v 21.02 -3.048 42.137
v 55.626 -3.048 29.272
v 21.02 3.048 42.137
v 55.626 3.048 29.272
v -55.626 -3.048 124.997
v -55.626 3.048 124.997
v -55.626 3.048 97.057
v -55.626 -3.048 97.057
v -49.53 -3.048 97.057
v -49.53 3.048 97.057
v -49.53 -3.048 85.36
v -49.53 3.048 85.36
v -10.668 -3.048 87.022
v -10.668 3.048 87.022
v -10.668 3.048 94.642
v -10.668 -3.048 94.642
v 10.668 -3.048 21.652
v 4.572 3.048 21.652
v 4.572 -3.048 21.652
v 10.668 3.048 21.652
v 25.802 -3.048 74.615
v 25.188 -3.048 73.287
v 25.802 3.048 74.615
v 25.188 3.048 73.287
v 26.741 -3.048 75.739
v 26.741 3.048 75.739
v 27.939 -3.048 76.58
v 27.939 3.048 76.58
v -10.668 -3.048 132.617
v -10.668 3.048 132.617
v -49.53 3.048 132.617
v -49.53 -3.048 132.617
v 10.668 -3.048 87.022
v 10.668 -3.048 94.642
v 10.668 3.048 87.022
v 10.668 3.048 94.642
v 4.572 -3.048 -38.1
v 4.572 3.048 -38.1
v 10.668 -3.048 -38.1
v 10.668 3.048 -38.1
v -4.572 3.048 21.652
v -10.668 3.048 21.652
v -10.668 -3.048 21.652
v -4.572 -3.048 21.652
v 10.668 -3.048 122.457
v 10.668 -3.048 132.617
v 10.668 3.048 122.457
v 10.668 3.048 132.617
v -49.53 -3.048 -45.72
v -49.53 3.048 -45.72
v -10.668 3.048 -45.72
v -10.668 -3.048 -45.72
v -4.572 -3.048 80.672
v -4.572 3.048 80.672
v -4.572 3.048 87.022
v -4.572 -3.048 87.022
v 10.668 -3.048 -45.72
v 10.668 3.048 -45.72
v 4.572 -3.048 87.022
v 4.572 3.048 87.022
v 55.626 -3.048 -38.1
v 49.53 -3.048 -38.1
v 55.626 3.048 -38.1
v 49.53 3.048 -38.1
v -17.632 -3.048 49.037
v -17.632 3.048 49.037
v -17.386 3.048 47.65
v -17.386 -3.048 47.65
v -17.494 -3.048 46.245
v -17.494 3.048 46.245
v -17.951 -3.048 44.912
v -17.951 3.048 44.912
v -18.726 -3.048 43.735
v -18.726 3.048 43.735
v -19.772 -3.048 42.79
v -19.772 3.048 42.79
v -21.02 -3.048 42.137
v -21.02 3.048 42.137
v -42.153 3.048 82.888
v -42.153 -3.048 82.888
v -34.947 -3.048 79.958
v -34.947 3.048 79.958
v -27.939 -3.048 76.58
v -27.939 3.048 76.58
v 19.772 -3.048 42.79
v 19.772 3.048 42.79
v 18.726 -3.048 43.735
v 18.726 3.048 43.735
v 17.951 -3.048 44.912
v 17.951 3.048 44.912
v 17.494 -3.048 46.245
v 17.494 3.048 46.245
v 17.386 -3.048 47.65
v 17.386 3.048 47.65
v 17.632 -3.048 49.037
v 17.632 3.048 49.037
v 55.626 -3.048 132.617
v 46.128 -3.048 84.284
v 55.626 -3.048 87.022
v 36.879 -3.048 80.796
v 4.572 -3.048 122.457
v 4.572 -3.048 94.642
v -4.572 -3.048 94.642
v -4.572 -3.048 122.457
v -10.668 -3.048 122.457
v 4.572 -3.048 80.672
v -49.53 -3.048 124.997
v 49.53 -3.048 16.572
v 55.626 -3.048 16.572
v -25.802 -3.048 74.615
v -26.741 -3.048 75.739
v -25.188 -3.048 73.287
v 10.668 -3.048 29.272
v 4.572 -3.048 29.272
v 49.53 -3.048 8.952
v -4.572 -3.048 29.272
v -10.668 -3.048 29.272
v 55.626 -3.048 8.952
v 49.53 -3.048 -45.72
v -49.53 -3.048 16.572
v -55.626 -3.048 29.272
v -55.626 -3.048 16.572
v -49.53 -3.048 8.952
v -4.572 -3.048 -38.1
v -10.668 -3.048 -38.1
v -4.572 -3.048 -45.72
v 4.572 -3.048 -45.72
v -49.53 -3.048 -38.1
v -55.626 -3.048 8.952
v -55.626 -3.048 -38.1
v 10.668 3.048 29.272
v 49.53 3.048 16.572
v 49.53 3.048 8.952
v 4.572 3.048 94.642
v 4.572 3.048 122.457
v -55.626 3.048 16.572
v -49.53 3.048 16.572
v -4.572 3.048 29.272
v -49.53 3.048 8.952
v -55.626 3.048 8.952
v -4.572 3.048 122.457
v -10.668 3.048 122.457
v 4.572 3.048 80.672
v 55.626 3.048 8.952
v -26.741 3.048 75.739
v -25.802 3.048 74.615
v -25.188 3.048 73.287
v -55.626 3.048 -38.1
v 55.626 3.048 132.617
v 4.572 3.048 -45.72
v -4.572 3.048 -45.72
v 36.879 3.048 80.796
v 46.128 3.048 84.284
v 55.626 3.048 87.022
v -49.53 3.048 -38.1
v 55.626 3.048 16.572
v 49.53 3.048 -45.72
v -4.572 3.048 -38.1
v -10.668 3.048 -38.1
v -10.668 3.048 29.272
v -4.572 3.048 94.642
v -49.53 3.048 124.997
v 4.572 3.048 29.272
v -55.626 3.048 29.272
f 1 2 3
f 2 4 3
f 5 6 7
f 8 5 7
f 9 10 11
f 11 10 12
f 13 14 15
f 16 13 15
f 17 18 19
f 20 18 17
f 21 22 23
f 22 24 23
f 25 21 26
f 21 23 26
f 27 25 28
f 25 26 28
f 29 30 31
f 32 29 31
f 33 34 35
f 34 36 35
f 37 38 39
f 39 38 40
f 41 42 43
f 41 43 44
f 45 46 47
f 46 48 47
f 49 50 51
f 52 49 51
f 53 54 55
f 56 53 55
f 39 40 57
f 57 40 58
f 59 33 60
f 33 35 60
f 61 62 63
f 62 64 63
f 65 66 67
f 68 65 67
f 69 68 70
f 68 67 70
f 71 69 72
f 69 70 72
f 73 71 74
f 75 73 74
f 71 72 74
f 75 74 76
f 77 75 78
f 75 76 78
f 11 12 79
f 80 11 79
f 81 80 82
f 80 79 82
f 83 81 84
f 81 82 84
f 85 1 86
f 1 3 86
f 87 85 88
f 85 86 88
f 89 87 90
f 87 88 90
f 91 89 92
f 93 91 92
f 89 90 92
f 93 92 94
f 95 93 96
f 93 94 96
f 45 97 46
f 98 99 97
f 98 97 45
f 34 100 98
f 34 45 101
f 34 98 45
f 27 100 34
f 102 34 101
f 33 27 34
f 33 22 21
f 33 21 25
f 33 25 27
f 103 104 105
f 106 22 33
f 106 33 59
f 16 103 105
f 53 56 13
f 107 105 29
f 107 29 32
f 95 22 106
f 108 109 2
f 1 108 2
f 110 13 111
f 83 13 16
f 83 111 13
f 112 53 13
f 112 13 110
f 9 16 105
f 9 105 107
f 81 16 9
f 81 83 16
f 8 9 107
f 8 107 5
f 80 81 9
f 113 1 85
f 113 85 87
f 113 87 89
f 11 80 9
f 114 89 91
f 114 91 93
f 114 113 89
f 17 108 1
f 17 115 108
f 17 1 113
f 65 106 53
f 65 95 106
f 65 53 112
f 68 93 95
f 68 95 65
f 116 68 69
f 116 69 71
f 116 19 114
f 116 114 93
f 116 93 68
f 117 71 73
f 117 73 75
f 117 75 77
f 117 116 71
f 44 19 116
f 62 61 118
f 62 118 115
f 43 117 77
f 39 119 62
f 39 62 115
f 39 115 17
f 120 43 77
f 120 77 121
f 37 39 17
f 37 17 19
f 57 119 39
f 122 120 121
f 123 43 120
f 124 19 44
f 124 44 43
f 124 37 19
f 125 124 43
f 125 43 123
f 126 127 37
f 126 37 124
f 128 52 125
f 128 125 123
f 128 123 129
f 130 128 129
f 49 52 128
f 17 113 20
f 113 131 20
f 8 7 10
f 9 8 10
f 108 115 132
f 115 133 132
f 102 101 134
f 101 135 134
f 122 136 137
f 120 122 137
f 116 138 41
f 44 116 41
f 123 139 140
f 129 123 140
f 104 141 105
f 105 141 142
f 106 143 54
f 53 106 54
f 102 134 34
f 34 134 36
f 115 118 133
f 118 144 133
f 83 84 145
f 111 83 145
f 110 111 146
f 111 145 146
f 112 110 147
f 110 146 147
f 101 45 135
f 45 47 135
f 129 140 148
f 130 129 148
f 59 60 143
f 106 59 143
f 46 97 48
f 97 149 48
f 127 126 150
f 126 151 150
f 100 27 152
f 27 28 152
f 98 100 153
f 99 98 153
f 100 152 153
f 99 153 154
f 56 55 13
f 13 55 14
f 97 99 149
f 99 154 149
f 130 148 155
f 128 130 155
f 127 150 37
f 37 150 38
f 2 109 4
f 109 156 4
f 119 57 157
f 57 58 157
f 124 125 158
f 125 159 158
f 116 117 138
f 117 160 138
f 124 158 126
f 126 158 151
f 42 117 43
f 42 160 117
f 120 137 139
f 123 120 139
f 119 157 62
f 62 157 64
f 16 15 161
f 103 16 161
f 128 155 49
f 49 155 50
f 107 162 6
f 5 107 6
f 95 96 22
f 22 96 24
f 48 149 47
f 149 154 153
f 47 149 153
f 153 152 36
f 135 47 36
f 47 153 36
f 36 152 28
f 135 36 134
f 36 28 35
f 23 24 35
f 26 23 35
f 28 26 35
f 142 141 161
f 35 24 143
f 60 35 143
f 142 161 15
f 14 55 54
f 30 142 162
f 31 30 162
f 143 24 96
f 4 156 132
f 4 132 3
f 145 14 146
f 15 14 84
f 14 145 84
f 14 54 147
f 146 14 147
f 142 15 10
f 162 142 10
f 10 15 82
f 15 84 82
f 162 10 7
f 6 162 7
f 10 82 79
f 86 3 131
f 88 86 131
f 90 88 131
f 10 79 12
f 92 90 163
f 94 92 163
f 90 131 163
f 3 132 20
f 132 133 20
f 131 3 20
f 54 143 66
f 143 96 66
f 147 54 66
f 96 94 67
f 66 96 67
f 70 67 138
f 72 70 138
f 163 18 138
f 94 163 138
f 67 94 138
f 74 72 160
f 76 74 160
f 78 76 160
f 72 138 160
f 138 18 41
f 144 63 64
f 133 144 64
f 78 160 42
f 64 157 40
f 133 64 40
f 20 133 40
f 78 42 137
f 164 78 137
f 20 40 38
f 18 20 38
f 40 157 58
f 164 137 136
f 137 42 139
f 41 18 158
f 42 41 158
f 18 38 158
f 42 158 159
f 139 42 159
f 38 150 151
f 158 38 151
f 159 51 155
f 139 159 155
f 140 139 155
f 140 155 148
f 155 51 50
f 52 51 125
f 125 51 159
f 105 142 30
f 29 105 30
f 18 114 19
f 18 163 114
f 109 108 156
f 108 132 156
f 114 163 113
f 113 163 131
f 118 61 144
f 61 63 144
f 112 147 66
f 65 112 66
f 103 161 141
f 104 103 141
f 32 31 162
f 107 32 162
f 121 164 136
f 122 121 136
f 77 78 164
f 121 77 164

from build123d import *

# Parameters (mm, degrees)
SKETCH1_W           = 6.096
SKETCH1_H           = 7.62
BOSS_EXTRUDE1_DEPTH = 3.048


with BuildPart() as part:
    # Sketch1 → Boss-Extrude1 (new, symmetric)
    with BuildSketch(Plane(origin=(0, 0, 0), x_dir=(1, 0, 0), z_dir=(0, 1, 0))):
        with BuildLine():
            Line((-49.53, 45.72), (-10.668, 45.72))
            Line((-10.668, 45.72), (-10.668, 38.1))
            Line((-10.668, 38.1), (-4.572, 38.1))
            Line((-4.572, 38.1), (-4.572, 45.72))
            Line((-4.572, 45.72), (4.572, 45.72))
            Line((4.572, 45.72), (4.572, 38.1))
            Line((4.572, 38.1), (10.668, 38.1))
            Line((10.668, 38.1), (10.668, 45.72))
            Line((10.668, 45.72), (49.53, 45.72))
            Line((49.53, 45.72), (49.53, 38.1))
            Line((49.53, 38.1), (55.626, 38.1))
            Line((55.626, 38.1), (55.626, -8.951856626))
            Line((55.626, -8.951856626), (49.53, -8.951856626))
            Line((49.53, -8.951856626), (49.53, -16.571856626))
            Line((49.53, -16.571856626), (55.626, -16.571856626))
            Line((55.626, -16.571856626), (55.626, -29.271856626))
            Line((55.626, -29.271856626), (21.019827136, -42.136821893))
            ThreePointArc((21.019827136, -42.136821893), (17.95098831, -44.911778638), (17.631953735, -49.036869377))
            Line((17.631953735, -49.036869377), (25.187729856, -73.287029113))
            ThreePointArc((25.187729856, -73.287029113), (26.234780075, -75.207903536), (27.939063878, -76.579577488))
            ThreePointArc((27.939063878, -76.579577488), (41.468907088, -82.632484358), (55.626, -87.022365809))
            Line((55.626, -87.022365809), (55.626, -132.617292876))
            Line((55.626, -132.617292876), (10.668, -132.617292876))
            Line((10.668, -132.617292876), (10.668, -122.457292876))
            Line((10.668, -122.457292876), (4.572, -122.457292876))
            Line((4.572, -122.457292876), (4.572, -94.642365809))
            Line((4.572, -94.642365809), (10.668, -94.642365809))
            Line((10.668, -94.642365809), (10.668, -87.022365809))
            Line((10.668, -87.022365809), (4.572, -87.022365809))
            Line((4.572, -87.022365809), (4.572, -80.672365809))
            Line((4.572, -80.672365809), (-4.572, -80.672365809))
            Line((-4.572, -80.672365809), (-4.572, -87.022365809))
            Line((-4.572, -87.022365809), (-10.668, -87.022365809))
            Line((-10.668, -87.022365809), (-10.668, -94.642365809))
            Line((-10.668, -94.642365809), (-4.572, -94.642365809))
            Line((-4.572, -94.642365809), (-4.572, -122.457292876))
            Line((-4.572, -122.457292876), (-10.668, -122.457292876))
            Line((-10.668, -122.457292876), (-10.668, -132.617292876))
            Line((-10.668, -132.617292876), (-49.53, -132.617292876))
            Line((-49.53, -132.617292876), (-49.53, -124.997292876))
            Line((-49.53, -124.997292876), (-55.626, -124.997292876))
            Line((-55.626, -124.997292876), (-55.626, -97.057292876))
            Line((-55.626, -97.057292876), (-49.53, -97.057292876))
            Line((-49.53, -97.057292876), (-49.53, -85.359826344))
            ThreePointArc((-49.53, -85.359826344), (-38.527111219, -81.479756652), (-27.939063878, -76.579577488))
            ThreePointArc((-27.939063878, -76.579577488), (-26.234780075, -75.207903536), (-25.187729856, -73.287029113))
            Line((-25.187729856, -73.287029113), (-17.631953735, -49.036869377))
            ThreePointArc((-17.631953735, -49.036869377), (-17.95098831, -44.911778638), (-21.019827136, -42.136821893))
            Line((-21.019827136, -42.136821893), (-55.626, -29.271856626))
            Line((-55.626, -29.271856626), (-55.626, -16.571856626))
            Line((-55.626, -16.571856626), (-49.53, -16.571856626))
            Line((-49.53, -16.571856626), (-49.53, -8.951856626))
            Line((-49.53, -8.951856626), (-55.626, -8.951856626))
            Line((-55.626, -8.951856626), (-55.626, 38.1))
            Line((-55.626, 38.1), (-49.53, 38.1))
            Line((-49.53, 38.1), (-49.53, 45.72))
        make_face()
        with Locations((7.62, -25.461856626)):
            Rectangle(SKETCH1_W, SKETCH1_H, mode=Mode.SUBTRACT)
        with Locations((-7.62, -25.461856626)):
            Rectangle(SKETCH1_W, SKETCH1_H, mode=Mode.SUBTRACT)
    extrude(amount=BOSS_EXTRUDE1_DEPTH, both=True)


solid = part.part
